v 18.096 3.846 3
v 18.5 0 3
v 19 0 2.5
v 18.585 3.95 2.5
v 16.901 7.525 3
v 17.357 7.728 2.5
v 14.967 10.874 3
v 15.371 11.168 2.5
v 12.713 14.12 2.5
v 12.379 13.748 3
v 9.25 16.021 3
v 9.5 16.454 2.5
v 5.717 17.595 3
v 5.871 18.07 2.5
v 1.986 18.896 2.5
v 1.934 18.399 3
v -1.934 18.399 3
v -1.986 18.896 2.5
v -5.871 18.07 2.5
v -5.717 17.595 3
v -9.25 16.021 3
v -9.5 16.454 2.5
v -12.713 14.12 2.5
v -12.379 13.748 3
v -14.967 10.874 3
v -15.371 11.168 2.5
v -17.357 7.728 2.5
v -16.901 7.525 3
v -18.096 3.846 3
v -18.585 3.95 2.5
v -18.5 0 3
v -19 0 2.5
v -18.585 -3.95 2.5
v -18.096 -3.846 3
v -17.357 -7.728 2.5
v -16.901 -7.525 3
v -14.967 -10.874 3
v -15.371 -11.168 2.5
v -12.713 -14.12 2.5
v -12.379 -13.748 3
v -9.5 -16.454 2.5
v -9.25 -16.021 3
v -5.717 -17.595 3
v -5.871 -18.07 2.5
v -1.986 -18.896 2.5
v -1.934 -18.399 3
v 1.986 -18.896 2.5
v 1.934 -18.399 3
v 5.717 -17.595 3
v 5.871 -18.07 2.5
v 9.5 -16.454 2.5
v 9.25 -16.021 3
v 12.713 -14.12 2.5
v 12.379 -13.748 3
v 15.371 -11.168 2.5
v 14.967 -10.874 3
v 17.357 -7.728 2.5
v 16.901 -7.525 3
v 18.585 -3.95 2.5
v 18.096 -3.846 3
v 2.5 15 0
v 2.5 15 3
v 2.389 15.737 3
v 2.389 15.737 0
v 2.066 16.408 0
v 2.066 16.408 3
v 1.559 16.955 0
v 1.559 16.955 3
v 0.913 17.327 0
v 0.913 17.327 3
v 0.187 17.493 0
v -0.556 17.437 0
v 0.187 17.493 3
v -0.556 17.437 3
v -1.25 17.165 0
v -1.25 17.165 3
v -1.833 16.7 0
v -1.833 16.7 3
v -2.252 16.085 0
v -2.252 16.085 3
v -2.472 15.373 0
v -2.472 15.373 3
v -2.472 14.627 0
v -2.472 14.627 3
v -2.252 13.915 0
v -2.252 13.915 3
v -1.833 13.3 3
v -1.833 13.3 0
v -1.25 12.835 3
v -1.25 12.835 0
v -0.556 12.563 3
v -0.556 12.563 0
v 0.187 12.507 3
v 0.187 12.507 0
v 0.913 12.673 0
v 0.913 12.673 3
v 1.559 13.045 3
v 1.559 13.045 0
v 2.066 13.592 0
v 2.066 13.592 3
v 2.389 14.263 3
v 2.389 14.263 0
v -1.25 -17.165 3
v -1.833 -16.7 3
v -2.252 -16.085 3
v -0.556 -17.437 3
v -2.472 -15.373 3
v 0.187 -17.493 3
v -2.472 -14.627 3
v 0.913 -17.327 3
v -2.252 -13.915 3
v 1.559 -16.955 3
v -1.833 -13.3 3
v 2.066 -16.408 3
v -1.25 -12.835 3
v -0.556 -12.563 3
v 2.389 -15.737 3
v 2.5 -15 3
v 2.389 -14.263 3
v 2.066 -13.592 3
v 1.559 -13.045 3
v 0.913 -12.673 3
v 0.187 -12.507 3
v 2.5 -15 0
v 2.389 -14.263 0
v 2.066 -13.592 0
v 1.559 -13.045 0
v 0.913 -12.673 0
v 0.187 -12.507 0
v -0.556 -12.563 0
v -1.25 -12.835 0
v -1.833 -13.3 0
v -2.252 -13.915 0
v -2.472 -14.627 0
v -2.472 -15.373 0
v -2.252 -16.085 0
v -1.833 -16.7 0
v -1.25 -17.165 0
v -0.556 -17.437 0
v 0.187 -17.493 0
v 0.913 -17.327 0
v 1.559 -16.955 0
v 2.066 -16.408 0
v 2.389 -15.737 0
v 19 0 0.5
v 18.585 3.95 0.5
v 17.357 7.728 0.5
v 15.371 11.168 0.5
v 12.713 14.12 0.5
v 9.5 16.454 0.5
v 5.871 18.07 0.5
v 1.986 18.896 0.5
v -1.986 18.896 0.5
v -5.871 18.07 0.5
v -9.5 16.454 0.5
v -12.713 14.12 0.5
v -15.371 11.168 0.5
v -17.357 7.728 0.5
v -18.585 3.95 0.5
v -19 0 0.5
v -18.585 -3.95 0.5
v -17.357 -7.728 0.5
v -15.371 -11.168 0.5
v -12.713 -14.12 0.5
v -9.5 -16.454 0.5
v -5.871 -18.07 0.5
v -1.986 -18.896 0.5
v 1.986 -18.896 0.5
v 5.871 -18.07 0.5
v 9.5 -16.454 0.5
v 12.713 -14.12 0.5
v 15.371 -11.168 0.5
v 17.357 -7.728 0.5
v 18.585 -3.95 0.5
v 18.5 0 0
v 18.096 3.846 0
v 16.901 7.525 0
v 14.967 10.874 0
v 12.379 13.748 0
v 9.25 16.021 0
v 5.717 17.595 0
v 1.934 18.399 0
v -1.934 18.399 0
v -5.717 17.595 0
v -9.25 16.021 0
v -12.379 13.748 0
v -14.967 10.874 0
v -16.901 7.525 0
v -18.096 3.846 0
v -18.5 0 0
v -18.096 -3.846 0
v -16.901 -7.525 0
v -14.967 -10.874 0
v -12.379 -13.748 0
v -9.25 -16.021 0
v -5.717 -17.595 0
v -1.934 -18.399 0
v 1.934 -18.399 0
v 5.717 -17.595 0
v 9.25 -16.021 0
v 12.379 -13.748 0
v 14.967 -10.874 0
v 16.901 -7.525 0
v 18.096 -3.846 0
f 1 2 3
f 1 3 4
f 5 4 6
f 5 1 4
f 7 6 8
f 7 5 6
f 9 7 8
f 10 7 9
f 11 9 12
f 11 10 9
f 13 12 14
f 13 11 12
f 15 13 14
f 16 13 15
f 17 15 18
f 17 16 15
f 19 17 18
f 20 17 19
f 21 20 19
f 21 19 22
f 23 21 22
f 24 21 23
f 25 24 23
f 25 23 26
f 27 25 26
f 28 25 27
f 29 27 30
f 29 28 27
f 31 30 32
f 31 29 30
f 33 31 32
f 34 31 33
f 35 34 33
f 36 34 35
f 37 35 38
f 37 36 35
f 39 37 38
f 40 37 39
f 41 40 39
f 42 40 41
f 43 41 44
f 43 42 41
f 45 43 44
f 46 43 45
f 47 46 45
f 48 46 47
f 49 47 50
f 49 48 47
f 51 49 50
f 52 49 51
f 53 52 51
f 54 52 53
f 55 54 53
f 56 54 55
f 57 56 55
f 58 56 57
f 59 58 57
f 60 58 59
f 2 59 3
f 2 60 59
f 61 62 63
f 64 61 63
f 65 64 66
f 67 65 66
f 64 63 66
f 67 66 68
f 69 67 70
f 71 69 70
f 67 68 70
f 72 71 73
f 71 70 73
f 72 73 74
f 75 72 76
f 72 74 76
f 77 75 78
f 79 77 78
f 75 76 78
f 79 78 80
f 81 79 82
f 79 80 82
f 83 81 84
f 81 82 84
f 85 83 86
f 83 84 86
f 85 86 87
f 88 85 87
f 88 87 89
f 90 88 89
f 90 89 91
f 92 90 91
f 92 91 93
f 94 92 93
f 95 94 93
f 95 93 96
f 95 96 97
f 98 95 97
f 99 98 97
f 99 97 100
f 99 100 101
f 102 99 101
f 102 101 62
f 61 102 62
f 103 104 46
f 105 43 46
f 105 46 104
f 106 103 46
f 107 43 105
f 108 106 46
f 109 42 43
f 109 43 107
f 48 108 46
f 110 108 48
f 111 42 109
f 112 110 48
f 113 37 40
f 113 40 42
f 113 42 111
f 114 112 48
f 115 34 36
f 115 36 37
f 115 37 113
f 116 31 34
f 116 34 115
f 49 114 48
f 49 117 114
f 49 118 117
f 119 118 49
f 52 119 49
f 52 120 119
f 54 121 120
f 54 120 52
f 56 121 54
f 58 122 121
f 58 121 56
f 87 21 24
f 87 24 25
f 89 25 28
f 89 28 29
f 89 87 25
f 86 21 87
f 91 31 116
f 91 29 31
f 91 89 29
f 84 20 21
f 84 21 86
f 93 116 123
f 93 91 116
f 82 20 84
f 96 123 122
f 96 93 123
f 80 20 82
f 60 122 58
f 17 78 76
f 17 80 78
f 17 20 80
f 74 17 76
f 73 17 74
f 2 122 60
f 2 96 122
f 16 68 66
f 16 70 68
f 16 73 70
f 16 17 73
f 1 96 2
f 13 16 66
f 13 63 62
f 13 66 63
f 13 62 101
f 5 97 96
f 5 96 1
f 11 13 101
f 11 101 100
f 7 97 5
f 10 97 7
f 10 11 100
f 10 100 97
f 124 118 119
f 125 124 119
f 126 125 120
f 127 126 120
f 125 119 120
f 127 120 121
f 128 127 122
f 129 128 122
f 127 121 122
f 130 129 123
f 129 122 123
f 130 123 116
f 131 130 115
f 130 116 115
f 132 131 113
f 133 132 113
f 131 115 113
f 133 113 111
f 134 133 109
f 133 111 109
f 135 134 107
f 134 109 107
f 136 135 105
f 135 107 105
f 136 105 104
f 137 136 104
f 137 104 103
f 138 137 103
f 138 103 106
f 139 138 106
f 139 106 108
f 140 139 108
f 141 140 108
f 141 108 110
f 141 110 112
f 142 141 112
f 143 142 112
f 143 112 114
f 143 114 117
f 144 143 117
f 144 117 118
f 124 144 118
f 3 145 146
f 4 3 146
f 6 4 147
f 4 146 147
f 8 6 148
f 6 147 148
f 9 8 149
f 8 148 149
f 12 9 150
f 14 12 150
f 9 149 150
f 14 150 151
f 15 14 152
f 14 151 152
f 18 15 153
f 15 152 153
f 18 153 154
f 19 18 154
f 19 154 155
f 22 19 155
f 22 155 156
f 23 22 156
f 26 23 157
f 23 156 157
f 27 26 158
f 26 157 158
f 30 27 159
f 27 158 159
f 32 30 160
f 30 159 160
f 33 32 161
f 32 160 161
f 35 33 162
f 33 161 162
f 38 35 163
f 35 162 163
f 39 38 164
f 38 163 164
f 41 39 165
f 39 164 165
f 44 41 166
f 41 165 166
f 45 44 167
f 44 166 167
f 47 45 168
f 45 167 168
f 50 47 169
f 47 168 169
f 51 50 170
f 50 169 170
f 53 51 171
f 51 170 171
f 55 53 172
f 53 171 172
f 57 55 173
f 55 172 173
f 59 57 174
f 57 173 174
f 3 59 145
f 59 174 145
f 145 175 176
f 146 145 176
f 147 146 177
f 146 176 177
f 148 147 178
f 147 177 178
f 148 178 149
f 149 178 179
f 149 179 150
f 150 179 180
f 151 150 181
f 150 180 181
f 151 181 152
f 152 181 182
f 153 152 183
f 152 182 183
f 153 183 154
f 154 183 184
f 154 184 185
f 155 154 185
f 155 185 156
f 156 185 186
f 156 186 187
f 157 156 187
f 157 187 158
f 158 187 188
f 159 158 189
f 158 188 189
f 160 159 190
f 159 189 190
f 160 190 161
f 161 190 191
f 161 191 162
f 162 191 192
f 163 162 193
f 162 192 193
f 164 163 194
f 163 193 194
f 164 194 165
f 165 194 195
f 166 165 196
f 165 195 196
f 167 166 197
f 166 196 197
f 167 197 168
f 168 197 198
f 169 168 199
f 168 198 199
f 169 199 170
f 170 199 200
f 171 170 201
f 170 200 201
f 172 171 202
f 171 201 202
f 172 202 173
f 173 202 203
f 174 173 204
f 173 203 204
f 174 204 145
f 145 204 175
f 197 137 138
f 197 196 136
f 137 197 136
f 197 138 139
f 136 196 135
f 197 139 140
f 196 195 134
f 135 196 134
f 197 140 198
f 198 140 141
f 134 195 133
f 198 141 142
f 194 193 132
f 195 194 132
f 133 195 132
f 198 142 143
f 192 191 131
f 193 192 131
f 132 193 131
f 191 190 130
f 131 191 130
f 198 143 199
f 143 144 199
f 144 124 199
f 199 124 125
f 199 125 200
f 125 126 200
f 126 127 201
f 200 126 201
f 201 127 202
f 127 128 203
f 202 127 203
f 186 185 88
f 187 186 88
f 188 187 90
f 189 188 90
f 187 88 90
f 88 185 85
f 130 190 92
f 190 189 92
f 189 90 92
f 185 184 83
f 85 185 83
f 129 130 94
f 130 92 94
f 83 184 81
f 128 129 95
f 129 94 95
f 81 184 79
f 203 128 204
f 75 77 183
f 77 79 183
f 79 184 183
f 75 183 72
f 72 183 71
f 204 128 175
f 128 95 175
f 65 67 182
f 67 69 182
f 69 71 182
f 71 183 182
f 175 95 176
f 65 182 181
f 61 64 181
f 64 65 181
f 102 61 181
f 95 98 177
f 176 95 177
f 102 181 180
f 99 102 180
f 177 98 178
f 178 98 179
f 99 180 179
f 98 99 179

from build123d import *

# Parameters (mm, degrees)
SKETCH_1_R          = 19
EXTRUDE_1_DEPTH     = 3
SKETCH_2_R          = 2.5
CUT_EXTRUDE_1_DEPTH = 13
CHAMFER_1_SIZE      = 0.5


with BuildPart() as part:
    # 草图1 → 拉伸1 (new body)
    with BuildSketch(Plane.XY):
        Circle(SKETCH_1_R)
    extrude(amount=EXTRUDE_1_DEPTH)

    # 草图2 → 切除-拉伸1 (cut)
    with BuildSketch(Plane.XY.offset(3)):
        with Locations((0, 15)):
            Circle(SKETCH_2_R)
        with Locations((0, -15)):
            Circle(SKETCH_2_R)
    extrude(amount=-CUT_EXTRUDE_1_DEPTH, mode=Mode.SUBTRACT)

    # 倒角1
    chamfer_1_edges = [part.edges().sort_by_distance(p)[0] for p in [
        (-19, 0, 0),
        (-19, 0, 3),
    ]]
    chamfer(chamfer_1_edges, length=CHAMFER_1_SIZE)


solid = part.part
